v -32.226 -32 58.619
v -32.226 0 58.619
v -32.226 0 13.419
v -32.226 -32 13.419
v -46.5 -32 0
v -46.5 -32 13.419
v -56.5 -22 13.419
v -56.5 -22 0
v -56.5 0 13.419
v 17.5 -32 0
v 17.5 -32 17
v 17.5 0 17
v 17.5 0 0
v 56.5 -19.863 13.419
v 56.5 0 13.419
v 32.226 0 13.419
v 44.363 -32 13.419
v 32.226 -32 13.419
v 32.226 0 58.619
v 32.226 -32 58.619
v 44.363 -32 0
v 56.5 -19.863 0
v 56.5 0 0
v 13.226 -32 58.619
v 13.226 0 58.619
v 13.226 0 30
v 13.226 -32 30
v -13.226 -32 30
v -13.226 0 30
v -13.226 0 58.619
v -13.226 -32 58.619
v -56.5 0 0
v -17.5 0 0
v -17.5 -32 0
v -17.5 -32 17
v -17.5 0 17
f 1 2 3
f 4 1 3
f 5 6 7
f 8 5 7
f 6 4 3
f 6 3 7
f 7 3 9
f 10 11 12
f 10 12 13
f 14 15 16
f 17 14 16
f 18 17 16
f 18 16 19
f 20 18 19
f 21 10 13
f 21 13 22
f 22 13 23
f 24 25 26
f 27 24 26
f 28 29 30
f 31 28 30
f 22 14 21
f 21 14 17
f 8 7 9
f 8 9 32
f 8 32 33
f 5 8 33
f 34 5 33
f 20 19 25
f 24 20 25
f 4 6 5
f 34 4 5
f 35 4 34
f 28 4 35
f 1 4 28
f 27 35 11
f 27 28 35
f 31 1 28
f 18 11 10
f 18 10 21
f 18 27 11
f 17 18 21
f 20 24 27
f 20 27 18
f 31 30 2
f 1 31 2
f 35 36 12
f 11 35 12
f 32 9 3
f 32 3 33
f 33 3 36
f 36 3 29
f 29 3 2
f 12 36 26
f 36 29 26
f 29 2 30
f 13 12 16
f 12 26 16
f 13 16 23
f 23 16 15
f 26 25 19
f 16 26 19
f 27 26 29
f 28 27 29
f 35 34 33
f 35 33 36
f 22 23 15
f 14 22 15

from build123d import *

# Parameters (mm, degrees)
F1_DEPTH = 32
F3_DEPTH = 13.419725
F5_DEPTH = 13.419725


with BuildPart() as f1:
    # F0 (on Front) → F1 (new body)
    with BuildSketch(Plane.XZ):
        Polygon((-56.5, 13.418725), (-56.5, 0), (-17.5, 0), (-17.5, 17), (17.5, 17), (17.5, 0), (56.5, 0), (56.5, 13.418725), (32.225927, 13.418725), (32.225927, 58.61873), (13.225927, 58.61873), (13.225927, 30), (-13.225927, 30), (-13.225927, 58.61873), (-32.225927, 58.61873), (-32.225927, 13.418725), align=None)
    extrude(amount=F1_DEPTH)

    # F2 (on face) → F3 (cut, through all)
    with BuildSketch(Plane.XY.offset(13.418725)):
        Polygon((-56.5, -32), (-46.5, -32), (-56.5, -22), align=None)
    extrude(amount=-F3_DEPTH, mode=Mode.SUBTRACT)

    # F4 (on face) → F5 (cut, through all)
    with BuildSketch(Plane.XY.offset(13.418725)):
        Polygon((56.5, -19.862964), (44.362964, -32), (56.5, -32), align=None)
    extrude(amount=-F5_DEPTH, mode=Mode.SUBTRACT)


solid = f1.part
